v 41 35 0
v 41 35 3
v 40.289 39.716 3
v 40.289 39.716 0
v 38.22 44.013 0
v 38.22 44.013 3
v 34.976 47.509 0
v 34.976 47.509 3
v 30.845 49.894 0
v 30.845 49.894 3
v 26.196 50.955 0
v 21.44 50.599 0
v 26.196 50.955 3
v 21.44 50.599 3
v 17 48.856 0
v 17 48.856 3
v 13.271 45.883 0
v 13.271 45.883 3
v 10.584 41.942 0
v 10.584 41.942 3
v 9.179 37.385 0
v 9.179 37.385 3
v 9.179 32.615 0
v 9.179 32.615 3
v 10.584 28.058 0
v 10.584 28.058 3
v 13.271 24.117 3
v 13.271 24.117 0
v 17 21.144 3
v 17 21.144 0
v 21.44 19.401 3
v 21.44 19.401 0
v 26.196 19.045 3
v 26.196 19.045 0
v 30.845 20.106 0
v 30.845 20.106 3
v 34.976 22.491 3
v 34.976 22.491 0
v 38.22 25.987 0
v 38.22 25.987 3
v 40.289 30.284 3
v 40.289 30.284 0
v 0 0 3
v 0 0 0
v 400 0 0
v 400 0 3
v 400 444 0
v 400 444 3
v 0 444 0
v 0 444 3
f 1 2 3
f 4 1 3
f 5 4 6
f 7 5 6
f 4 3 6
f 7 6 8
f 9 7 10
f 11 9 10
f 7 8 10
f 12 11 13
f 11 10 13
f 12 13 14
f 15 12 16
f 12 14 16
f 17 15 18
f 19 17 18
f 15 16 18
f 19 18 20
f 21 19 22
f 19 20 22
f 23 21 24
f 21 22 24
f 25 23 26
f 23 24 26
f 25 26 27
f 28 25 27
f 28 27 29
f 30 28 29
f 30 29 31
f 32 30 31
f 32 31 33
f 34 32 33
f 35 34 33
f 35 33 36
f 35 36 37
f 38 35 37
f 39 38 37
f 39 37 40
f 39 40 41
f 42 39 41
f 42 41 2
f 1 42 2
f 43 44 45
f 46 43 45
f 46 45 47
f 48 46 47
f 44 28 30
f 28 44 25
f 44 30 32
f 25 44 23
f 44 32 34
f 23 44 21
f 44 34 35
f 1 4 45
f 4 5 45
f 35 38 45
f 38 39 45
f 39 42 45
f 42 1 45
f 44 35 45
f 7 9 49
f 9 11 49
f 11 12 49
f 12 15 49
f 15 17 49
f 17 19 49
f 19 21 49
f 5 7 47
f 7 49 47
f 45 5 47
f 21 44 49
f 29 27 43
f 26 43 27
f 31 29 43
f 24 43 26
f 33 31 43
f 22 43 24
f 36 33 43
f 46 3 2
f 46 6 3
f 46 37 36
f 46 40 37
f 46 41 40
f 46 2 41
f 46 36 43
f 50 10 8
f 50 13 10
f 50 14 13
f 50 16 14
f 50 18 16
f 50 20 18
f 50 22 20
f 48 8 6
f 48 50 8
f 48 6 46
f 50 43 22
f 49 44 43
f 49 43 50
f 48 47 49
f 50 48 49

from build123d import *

# Parameters (mm, degrees)
SKETCH1_W           = 400
SKETCH1_H           = 452
BOSS_EXTRUDE1_DEPTH = 3
SKETCH4_R           = 16
CUT_EXTRUDE2_DEPTH  = 10
SKETCH5_W           = 400
SKETCH5_H           = 8
CUT_EXTRUDE3_DEPTH  = 4


with BuildPart() as part:
    # Sketch1 → Boss-Extrude1 (new body)
    with BuildSketch(Plane.XY):
        with Locations((200, 226)):
            Rectangle(SKETCH1_W, SKETCH1_H)
    extrude(amount=BOSS_EXTRUDE1_DEPTH)

    # Sketch4 → Cut-Extrude2 (cut)
    with BuildSketch(Plane.XY.offset(3)):
        with Locations((25, 35)):
            Circle(SKETCH4_R)
    extrude(amount=-CUT_EXTRUDE2_DEPTH, mode=Mode.SUBTRACT)

    # Sketch5 → Cut-Extrude3 (cut, through all)
    with BuildSketch(Plane(origin=(0, 0, 0), x_dir=(-1, 0, 0), z_dir=(0, 0, -1))):
        with Locations((-200, 448)):
            Rectangle(SKETCH5_W, SKETCH5_H)
    extrude(amount=-CUT_EXTRUDE3_DEPTH, mode=Mode.SUBTRACT)


solid = part.part
